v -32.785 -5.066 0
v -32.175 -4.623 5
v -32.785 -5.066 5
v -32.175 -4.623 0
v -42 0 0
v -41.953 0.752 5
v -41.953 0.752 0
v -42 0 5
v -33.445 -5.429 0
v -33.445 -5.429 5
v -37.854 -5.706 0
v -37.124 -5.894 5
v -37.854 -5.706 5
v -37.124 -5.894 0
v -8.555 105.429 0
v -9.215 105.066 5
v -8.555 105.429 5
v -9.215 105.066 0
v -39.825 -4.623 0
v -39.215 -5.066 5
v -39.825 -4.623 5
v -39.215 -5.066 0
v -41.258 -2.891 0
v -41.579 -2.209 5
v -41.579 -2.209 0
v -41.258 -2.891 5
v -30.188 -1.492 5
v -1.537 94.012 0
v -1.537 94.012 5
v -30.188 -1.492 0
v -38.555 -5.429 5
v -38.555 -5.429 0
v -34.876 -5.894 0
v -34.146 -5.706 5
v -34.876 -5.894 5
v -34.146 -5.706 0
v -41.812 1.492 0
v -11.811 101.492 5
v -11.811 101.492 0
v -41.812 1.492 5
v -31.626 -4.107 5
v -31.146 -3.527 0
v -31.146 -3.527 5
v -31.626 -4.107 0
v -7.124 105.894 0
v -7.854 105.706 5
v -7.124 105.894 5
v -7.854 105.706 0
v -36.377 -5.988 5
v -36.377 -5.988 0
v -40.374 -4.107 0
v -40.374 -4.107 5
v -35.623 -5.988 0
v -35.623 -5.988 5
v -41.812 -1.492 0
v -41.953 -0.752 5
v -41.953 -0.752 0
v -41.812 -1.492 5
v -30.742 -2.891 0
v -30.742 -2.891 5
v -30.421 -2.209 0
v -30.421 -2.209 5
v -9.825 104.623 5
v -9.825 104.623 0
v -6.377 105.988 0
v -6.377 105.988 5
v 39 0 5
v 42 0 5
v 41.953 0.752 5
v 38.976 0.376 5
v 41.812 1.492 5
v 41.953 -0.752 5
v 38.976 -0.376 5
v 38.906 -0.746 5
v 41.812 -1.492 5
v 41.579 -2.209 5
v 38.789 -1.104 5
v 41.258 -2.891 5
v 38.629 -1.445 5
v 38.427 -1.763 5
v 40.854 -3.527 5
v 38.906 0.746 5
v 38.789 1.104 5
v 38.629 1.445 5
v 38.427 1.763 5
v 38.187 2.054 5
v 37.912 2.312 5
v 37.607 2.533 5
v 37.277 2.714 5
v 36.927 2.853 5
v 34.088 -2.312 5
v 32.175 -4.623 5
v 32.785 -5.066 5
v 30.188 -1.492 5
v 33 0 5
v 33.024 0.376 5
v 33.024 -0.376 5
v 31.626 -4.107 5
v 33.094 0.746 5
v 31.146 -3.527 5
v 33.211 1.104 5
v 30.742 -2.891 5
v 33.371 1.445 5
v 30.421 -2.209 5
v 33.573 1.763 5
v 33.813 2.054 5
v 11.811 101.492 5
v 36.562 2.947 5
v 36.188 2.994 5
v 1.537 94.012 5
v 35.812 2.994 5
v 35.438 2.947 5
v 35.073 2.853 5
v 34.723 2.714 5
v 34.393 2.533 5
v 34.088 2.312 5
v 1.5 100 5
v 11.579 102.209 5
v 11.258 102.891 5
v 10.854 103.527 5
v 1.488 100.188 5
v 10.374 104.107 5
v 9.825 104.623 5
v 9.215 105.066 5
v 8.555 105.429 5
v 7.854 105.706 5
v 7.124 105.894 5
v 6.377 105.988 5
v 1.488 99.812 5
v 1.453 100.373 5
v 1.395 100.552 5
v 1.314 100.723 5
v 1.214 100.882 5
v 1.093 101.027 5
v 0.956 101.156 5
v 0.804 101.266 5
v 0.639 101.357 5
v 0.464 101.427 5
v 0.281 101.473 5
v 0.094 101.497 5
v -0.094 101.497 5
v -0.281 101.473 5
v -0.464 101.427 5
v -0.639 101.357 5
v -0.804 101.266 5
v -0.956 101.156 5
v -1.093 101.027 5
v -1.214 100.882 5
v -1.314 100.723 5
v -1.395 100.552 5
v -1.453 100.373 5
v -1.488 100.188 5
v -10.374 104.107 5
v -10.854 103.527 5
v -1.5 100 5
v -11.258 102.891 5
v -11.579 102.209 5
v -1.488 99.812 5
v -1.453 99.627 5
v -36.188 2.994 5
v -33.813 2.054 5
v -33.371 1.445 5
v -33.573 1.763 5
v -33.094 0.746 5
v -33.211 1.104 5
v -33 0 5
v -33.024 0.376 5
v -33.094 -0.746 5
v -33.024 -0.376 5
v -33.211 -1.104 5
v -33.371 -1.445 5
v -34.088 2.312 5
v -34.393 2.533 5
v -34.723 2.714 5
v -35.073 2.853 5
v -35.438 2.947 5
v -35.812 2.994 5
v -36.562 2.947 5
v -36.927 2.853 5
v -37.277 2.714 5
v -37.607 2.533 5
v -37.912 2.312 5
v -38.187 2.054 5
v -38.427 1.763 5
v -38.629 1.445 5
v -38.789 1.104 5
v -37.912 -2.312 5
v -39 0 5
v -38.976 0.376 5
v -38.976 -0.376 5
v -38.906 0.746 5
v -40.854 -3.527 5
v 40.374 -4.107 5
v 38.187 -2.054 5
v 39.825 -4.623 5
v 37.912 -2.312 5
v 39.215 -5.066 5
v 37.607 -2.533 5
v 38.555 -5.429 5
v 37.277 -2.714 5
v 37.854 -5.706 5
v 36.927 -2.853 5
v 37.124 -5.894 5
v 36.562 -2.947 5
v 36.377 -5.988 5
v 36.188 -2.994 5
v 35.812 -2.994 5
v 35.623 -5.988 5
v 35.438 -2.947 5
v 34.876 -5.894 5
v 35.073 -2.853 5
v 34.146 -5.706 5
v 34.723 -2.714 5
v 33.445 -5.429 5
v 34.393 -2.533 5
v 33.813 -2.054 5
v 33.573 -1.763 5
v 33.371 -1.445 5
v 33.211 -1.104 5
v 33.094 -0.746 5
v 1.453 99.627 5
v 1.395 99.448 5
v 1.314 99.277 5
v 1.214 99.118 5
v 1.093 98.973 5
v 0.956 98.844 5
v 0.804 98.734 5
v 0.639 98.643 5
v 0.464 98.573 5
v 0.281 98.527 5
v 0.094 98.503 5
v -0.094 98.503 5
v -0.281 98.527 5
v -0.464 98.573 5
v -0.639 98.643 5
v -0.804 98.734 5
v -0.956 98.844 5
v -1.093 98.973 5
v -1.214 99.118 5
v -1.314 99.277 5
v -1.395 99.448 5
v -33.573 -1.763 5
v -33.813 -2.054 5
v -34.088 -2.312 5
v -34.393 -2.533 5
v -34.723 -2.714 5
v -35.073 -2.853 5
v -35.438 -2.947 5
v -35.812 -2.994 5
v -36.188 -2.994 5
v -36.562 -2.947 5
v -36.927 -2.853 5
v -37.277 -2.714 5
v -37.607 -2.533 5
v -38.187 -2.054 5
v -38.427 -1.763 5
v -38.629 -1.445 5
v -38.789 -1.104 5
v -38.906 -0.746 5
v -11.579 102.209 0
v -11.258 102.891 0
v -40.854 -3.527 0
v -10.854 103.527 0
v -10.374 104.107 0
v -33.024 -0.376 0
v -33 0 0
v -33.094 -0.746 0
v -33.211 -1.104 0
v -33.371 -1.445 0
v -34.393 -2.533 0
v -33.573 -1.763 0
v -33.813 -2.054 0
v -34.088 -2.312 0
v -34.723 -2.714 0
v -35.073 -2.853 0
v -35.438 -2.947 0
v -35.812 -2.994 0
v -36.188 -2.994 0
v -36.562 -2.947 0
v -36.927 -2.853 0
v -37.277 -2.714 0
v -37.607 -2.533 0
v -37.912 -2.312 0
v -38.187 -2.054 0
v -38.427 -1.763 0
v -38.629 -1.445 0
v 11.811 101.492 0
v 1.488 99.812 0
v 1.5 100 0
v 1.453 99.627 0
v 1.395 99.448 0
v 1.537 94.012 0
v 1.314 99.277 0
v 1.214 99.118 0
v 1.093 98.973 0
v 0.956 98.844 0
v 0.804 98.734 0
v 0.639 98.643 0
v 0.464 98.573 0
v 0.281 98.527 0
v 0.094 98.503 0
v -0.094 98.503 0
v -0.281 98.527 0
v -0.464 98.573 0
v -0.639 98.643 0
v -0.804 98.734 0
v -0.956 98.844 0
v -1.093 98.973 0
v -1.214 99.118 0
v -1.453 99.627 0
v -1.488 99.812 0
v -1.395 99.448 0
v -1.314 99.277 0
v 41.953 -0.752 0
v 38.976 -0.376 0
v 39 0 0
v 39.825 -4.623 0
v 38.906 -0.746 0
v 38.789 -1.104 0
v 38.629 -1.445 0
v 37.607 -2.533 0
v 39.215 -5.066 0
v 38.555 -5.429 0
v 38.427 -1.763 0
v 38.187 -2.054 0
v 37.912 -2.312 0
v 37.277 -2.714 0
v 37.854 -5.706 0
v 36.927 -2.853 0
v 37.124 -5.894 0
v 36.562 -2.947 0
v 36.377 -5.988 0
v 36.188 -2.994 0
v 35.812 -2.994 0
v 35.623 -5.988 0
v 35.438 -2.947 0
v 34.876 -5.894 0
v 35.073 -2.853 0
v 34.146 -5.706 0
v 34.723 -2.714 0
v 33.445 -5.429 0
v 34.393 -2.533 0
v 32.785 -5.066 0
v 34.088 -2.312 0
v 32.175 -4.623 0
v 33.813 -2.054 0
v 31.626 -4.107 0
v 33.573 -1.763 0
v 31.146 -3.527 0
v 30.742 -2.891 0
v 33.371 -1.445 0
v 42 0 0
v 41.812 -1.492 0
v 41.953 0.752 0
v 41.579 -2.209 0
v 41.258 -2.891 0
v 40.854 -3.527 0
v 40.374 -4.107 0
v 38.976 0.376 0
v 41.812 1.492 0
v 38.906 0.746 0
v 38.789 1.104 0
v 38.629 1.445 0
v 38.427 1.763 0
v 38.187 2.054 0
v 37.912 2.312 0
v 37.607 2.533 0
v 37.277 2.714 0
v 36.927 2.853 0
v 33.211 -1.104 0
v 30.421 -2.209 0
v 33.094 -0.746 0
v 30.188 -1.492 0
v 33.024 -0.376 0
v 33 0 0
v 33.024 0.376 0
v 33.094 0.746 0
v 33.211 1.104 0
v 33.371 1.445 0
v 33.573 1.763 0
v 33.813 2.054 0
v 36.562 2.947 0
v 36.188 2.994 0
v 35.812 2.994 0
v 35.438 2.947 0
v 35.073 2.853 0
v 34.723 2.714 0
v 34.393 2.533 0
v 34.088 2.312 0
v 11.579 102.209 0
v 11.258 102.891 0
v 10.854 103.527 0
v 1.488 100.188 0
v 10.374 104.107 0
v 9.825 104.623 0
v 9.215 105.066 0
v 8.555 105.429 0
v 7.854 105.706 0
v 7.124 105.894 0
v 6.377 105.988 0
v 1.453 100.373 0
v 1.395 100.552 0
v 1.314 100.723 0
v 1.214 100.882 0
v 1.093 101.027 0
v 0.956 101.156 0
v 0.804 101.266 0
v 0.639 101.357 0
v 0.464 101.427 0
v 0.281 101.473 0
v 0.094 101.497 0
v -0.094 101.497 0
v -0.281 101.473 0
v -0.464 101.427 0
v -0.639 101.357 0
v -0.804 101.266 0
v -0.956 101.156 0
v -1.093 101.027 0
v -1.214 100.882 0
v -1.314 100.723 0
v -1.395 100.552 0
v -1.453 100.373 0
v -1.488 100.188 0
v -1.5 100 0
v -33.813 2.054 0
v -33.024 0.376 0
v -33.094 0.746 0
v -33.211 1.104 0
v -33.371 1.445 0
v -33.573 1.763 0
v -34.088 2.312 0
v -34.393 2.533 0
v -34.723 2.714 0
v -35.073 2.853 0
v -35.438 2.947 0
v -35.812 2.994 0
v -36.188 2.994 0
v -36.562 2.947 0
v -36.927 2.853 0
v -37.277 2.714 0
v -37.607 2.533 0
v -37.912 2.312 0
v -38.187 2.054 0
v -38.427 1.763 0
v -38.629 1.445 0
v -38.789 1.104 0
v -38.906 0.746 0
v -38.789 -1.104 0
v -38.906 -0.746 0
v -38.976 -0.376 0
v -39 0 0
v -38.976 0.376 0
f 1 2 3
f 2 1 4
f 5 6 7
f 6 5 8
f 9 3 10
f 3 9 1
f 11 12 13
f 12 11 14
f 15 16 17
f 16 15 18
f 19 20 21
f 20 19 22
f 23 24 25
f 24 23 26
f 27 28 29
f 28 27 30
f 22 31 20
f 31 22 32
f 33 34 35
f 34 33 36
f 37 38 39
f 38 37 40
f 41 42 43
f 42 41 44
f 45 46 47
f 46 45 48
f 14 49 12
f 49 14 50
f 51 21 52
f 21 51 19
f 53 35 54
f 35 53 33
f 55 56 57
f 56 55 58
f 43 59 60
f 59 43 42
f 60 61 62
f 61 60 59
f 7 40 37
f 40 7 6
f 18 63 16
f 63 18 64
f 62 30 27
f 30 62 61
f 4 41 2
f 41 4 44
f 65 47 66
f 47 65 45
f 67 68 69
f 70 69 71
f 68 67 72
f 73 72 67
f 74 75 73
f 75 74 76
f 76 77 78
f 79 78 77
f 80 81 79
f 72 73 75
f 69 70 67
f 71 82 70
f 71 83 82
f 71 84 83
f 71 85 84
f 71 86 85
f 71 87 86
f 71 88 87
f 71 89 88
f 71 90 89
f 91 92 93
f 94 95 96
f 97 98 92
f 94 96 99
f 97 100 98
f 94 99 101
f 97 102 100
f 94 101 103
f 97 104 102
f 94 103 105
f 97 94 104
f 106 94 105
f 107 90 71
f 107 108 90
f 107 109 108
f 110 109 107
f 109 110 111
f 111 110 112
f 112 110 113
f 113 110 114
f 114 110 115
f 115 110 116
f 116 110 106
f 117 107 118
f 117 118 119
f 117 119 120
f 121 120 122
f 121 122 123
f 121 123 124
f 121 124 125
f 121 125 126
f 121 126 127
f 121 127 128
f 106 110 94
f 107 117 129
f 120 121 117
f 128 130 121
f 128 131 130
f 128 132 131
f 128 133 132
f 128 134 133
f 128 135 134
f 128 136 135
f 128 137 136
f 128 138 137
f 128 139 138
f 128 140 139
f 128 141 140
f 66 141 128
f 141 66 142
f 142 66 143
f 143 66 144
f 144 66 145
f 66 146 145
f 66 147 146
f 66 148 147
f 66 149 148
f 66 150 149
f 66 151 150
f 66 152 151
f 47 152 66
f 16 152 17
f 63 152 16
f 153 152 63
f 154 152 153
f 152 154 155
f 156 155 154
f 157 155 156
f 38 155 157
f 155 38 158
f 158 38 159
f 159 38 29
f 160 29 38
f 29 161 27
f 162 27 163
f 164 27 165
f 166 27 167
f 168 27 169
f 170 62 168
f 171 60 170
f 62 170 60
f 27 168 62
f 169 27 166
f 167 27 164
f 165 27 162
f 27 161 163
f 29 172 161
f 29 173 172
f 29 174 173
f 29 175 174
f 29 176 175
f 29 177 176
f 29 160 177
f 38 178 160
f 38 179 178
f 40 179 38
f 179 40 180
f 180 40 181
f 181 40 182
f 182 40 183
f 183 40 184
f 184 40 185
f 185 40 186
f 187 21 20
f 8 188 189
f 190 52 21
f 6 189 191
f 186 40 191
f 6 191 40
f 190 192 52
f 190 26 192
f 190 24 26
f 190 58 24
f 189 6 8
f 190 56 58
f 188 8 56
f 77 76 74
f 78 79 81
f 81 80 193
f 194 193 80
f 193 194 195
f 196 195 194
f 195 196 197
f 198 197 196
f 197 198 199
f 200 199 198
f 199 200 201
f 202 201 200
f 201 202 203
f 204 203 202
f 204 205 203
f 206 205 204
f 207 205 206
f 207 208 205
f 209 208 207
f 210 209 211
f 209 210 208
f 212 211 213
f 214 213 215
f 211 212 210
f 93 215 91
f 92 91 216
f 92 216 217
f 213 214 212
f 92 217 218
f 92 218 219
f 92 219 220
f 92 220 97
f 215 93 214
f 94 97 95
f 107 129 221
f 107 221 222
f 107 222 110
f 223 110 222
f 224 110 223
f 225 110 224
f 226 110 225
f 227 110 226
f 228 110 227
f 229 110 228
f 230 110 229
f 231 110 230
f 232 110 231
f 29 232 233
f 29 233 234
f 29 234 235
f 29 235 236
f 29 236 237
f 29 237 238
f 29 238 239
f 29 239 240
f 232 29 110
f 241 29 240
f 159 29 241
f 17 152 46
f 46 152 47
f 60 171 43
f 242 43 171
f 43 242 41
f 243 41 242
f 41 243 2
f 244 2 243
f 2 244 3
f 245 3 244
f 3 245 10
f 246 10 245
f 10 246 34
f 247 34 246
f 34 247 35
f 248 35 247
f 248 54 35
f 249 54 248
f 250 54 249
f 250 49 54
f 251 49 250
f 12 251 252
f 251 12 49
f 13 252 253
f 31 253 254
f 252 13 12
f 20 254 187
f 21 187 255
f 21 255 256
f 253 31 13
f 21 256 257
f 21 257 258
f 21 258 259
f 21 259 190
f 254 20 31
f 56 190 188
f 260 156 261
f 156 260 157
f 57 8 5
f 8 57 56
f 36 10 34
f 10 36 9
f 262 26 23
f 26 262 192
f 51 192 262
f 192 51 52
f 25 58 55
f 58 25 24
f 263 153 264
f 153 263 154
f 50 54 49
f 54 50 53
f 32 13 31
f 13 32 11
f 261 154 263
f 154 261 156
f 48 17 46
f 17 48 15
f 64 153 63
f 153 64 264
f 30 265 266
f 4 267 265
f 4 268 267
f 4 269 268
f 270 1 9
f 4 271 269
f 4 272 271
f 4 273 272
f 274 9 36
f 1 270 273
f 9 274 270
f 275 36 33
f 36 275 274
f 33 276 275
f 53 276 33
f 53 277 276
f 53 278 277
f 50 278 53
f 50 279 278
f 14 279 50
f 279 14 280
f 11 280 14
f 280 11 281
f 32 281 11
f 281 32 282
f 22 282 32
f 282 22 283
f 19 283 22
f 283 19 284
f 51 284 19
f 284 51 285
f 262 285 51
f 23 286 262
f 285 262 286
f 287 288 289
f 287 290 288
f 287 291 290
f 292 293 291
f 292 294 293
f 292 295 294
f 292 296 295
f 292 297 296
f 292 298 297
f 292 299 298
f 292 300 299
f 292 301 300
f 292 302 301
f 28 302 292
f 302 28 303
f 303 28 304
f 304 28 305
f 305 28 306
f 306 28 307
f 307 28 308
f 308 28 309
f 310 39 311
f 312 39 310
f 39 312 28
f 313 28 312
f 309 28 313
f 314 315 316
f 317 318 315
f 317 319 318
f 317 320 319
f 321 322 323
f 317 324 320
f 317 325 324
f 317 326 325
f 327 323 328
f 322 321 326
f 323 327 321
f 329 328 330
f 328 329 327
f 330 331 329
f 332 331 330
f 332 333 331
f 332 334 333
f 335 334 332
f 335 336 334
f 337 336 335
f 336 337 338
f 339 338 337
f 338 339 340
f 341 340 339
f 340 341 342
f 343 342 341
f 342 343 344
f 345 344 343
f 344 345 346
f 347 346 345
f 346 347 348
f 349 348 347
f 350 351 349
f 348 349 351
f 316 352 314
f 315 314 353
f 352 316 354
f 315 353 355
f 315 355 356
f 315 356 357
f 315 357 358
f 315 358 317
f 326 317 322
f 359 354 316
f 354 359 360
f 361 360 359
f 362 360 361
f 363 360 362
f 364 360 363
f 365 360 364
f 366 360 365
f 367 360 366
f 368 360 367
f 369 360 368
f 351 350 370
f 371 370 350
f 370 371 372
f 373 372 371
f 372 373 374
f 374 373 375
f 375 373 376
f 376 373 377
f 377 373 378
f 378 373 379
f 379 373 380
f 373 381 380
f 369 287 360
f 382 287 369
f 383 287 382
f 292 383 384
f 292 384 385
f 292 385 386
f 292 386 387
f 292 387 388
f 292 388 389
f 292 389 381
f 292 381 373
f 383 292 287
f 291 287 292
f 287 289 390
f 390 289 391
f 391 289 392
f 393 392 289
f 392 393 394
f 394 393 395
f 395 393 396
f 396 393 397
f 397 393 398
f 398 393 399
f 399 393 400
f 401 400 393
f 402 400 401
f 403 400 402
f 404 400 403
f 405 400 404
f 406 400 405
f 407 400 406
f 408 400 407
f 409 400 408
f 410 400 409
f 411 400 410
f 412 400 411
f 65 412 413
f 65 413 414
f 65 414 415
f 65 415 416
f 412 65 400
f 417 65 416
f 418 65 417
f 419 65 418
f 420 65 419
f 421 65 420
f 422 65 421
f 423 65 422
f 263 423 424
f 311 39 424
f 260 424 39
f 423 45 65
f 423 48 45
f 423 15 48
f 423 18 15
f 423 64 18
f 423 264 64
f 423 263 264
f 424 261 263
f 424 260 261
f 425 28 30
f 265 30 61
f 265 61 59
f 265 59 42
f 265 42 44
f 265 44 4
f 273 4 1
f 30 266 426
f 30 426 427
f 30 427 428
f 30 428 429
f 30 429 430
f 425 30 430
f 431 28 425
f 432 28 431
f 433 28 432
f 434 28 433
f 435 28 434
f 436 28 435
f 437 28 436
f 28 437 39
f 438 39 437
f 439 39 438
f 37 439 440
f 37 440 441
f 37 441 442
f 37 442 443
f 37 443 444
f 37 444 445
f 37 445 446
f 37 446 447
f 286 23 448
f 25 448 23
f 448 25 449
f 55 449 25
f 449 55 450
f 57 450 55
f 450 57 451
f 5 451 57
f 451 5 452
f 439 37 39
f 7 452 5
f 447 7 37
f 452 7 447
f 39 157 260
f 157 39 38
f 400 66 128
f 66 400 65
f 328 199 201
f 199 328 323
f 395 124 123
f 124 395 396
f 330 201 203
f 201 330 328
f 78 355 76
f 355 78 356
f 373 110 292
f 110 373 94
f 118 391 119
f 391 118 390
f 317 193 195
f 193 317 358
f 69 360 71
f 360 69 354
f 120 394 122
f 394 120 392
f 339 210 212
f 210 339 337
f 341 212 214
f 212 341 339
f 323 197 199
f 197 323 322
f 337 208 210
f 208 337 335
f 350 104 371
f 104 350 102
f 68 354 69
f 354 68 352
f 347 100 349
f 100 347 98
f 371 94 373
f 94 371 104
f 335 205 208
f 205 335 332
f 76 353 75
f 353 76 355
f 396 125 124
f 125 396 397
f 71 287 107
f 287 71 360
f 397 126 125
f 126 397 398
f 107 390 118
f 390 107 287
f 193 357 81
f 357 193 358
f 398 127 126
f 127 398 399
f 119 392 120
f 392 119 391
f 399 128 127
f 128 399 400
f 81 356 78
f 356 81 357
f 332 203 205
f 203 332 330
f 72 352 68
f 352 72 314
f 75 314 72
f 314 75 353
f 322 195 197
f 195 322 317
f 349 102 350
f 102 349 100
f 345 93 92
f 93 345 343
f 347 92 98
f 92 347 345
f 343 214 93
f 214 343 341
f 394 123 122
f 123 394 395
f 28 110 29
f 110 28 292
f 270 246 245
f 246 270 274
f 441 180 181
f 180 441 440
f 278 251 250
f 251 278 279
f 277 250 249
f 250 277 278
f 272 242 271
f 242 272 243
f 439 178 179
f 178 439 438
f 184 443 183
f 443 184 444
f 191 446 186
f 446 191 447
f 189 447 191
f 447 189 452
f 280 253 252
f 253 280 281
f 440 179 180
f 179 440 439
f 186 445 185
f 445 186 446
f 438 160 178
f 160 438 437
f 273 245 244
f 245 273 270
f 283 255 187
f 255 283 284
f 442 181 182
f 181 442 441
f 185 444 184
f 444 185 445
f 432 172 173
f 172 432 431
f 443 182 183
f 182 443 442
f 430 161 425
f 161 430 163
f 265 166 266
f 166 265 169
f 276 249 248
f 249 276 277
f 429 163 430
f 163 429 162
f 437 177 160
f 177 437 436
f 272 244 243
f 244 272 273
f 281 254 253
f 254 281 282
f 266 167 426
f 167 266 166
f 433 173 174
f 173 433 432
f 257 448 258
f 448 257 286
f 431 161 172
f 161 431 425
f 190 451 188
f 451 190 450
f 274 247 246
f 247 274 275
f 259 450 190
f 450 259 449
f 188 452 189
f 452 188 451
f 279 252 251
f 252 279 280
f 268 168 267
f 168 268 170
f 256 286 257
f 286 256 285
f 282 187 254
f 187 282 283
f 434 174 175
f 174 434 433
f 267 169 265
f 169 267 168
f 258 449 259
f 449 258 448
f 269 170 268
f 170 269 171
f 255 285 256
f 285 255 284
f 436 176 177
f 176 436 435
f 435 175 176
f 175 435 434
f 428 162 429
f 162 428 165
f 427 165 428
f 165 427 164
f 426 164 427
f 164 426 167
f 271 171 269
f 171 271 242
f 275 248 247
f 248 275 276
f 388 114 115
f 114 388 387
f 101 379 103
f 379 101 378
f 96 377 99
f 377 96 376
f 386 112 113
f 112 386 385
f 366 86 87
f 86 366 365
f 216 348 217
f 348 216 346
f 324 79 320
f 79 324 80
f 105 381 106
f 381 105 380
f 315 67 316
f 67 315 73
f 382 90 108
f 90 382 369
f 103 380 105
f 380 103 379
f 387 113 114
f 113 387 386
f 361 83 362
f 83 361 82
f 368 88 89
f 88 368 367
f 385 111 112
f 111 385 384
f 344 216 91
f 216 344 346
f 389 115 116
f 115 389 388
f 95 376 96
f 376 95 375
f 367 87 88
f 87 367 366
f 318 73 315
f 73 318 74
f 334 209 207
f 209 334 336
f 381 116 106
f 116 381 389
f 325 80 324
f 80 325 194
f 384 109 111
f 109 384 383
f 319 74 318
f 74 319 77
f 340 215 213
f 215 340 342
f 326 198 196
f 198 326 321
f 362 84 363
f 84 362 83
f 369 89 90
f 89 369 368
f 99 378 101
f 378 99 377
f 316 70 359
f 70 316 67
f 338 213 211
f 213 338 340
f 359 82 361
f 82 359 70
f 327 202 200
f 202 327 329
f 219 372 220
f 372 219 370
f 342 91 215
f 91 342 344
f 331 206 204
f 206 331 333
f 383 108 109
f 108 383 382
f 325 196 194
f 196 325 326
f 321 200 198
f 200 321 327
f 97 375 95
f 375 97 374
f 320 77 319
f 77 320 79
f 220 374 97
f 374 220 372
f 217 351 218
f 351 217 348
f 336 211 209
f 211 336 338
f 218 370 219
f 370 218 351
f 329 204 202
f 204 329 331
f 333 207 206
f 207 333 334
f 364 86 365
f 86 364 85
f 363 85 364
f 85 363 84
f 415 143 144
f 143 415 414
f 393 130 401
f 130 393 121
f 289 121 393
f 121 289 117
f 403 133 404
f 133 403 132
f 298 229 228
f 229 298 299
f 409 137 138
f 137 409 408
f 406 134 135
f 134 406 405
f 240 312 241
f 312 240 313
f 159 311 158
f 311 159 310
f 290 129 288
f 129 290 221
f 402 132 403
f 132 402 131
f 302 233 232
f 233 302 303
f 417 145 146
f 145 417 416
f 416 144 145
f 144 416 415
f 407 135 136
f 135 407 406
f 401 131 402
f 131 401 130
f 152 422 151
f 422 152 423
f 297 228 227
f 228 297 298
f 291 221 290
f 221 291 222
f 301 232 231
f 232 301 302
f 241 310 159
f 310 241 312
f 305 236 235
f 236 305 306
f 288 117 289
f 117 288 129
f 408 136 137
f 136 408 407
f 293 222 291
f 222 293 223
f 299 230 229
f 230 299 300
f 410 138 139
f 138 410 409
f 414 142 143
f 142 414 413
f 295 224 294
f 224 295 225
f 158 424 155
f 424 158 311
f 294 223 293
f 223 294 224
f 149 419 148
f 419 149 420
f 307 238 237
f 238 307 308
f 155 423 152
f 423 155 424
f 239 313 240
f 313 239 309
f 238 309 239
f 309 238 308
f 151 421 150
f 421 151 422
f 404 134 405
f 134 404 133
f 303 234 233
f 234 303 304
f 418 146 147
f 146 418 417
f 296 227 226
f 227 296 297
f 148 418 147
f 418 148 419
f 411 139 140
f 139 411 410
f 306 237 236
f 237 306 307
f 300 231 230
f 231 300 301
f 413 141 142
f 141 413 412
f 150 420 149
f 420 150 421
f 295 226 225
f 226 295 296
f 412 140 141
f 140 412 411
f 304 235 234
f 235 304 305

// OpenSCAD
// file: ../parameters.scad
ears_distance = 72;
ears_width = 2;
ears_hole_width = ears_width + 1;
ears_length = 8;
ears_height = 10;
ears_hole_from_bottom = 5;

release_length = 20;
release_thickness = 3;

beam_diameter = 6;


servo_thickness = 13;
servo_length = 23;
servo_holes_diameter = 2;
servo_holes_distance = 27;
servo_axis_offset = 5.5;
// main file
include <../parameters.scad>

$fn=50;

module 888_1002(){

	difference(){

		union(){

			for(i=[-1, 1]) hull() {
				translate([ears_distance/2*i, 0, 0])
					cylinder(d = beam_diameter+6, h = 5);
				translate([beam_diameter*i, 100, 0])
					cylinder(d = beam_diameter+6, h = 5);
			}

			hull(){
				translate([beam_diameter*1, 100, 0])
					cylinder(d = beam_diameter+6, h = 5);
				translate([beam_diameter*-1, 100, 0])
					cylinder(d = beam_diameter+6, h = 5);
			}

		}


			for(i=[-1, 1]) hull() {
				translate([ears_distance/2*i, 0, -0.5])
					cylinder(d = beam_diameter, h = 6);
			}

			translate([0, 100, -0.5])
				cylinder(d = 3, h = 6);


	}



}


888_1002();
